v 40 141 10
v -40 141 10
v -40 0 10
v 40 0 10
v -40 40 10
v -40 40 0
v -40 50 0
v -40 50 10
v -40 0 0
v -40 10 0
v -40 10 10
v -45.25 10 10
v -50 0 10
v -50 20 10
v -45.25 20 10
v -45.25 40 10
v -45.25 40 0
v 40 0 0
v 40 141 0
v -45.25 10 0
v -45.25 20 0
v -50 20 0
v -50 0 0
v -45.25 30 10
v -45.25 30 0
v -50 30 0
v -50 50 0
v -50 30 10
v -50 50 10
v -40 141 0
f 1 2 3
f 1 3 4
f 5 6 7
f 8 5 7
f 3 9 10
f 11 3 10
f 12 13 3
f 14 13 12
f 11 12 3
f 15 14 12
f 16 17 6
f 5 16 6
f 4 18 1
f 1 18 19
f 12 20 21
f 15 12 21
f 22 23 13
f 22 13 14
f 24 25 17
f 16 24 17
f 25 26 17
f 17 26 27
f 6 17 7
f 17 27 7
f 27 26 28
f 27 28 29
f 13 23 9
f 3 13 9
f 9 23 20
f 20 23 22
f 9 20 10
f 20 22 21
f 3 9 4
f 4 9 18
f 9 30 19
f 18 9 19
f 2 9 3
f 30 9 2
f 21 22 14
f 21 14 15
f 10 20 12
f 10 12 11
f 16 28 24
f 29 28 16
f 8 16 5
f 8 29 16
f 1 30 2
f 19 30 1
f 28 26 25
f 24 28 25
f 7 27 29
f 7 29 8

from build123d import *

# Parameters (mm, degrees)
BOX_W        = 80
BOX_H        = 141
BOX_DEPTH    = 10
BOX003_W     = 10
BOX003_H     = 10
BOX003_DEPTH = 10
BOX002_W     = 5.25
BOX002_H     = 30
BOX002_DEPTH = 10
BOX001_W     = 10
BOX001_H     = 50
BOX001_DEPTH = 10


with BuildPart() as cube:
    # Box → Box (new body)
    with BuildSketch(Plane(origin=(-40, 0, 0), x_dir=(1, 0, 0), z_dir=(0, 0, 1))):
        with Locations((40, 70.5)):
            Rectangle(BOX_W, BOX_H)
    extrude(amount=BOX_DEPTH)


with BuildPart() as box003:
    # Box003 → Box003 (new body)
    with BuildSketch(Plane(origin=(-50, 20, 0), x_dir=(1, 0, 0), z_dir=(0, 0, 1))):
        with Locations((5, 5)):
            Rectangle(BOX003_W, BOX003_H)
    extrude(amount=BOX003_DEPTH)


with BuildPart() as box002:
    # Box002 → Box002 (new body)
    with BuildSketch(Plane(origin=(-45.25, 10, 0), x_dir=(1, 0, 0), z_dir=(0, 0, 1))):
        with Locations((2.625, 15)):
            Rectangle(BOX002_W, BOX002_H)
    extrude(amount=BOX002_DEPTH)


with BuildPart() as cut001:
    # Box001 → Box001 (new body)
    with BuildSketch(Plane(origin=(-50, 0, 0), x_dir=(1, 0, 0), z_dir=(0, 0, 1))):
        with Locations((5, 25)):
            Rectangle(BOX001_W, BOX001_H)
    extrude(amount=BOX001_DEPTH)

    # Cut: cut Box002
    add(box002.part, mode=Mode.SUBTRACT)

    # Cut001: cut Box003
    add(box003.part, mode=Mode.SUBTRACT)


solid = Compound([cube.part, cut001.part])
